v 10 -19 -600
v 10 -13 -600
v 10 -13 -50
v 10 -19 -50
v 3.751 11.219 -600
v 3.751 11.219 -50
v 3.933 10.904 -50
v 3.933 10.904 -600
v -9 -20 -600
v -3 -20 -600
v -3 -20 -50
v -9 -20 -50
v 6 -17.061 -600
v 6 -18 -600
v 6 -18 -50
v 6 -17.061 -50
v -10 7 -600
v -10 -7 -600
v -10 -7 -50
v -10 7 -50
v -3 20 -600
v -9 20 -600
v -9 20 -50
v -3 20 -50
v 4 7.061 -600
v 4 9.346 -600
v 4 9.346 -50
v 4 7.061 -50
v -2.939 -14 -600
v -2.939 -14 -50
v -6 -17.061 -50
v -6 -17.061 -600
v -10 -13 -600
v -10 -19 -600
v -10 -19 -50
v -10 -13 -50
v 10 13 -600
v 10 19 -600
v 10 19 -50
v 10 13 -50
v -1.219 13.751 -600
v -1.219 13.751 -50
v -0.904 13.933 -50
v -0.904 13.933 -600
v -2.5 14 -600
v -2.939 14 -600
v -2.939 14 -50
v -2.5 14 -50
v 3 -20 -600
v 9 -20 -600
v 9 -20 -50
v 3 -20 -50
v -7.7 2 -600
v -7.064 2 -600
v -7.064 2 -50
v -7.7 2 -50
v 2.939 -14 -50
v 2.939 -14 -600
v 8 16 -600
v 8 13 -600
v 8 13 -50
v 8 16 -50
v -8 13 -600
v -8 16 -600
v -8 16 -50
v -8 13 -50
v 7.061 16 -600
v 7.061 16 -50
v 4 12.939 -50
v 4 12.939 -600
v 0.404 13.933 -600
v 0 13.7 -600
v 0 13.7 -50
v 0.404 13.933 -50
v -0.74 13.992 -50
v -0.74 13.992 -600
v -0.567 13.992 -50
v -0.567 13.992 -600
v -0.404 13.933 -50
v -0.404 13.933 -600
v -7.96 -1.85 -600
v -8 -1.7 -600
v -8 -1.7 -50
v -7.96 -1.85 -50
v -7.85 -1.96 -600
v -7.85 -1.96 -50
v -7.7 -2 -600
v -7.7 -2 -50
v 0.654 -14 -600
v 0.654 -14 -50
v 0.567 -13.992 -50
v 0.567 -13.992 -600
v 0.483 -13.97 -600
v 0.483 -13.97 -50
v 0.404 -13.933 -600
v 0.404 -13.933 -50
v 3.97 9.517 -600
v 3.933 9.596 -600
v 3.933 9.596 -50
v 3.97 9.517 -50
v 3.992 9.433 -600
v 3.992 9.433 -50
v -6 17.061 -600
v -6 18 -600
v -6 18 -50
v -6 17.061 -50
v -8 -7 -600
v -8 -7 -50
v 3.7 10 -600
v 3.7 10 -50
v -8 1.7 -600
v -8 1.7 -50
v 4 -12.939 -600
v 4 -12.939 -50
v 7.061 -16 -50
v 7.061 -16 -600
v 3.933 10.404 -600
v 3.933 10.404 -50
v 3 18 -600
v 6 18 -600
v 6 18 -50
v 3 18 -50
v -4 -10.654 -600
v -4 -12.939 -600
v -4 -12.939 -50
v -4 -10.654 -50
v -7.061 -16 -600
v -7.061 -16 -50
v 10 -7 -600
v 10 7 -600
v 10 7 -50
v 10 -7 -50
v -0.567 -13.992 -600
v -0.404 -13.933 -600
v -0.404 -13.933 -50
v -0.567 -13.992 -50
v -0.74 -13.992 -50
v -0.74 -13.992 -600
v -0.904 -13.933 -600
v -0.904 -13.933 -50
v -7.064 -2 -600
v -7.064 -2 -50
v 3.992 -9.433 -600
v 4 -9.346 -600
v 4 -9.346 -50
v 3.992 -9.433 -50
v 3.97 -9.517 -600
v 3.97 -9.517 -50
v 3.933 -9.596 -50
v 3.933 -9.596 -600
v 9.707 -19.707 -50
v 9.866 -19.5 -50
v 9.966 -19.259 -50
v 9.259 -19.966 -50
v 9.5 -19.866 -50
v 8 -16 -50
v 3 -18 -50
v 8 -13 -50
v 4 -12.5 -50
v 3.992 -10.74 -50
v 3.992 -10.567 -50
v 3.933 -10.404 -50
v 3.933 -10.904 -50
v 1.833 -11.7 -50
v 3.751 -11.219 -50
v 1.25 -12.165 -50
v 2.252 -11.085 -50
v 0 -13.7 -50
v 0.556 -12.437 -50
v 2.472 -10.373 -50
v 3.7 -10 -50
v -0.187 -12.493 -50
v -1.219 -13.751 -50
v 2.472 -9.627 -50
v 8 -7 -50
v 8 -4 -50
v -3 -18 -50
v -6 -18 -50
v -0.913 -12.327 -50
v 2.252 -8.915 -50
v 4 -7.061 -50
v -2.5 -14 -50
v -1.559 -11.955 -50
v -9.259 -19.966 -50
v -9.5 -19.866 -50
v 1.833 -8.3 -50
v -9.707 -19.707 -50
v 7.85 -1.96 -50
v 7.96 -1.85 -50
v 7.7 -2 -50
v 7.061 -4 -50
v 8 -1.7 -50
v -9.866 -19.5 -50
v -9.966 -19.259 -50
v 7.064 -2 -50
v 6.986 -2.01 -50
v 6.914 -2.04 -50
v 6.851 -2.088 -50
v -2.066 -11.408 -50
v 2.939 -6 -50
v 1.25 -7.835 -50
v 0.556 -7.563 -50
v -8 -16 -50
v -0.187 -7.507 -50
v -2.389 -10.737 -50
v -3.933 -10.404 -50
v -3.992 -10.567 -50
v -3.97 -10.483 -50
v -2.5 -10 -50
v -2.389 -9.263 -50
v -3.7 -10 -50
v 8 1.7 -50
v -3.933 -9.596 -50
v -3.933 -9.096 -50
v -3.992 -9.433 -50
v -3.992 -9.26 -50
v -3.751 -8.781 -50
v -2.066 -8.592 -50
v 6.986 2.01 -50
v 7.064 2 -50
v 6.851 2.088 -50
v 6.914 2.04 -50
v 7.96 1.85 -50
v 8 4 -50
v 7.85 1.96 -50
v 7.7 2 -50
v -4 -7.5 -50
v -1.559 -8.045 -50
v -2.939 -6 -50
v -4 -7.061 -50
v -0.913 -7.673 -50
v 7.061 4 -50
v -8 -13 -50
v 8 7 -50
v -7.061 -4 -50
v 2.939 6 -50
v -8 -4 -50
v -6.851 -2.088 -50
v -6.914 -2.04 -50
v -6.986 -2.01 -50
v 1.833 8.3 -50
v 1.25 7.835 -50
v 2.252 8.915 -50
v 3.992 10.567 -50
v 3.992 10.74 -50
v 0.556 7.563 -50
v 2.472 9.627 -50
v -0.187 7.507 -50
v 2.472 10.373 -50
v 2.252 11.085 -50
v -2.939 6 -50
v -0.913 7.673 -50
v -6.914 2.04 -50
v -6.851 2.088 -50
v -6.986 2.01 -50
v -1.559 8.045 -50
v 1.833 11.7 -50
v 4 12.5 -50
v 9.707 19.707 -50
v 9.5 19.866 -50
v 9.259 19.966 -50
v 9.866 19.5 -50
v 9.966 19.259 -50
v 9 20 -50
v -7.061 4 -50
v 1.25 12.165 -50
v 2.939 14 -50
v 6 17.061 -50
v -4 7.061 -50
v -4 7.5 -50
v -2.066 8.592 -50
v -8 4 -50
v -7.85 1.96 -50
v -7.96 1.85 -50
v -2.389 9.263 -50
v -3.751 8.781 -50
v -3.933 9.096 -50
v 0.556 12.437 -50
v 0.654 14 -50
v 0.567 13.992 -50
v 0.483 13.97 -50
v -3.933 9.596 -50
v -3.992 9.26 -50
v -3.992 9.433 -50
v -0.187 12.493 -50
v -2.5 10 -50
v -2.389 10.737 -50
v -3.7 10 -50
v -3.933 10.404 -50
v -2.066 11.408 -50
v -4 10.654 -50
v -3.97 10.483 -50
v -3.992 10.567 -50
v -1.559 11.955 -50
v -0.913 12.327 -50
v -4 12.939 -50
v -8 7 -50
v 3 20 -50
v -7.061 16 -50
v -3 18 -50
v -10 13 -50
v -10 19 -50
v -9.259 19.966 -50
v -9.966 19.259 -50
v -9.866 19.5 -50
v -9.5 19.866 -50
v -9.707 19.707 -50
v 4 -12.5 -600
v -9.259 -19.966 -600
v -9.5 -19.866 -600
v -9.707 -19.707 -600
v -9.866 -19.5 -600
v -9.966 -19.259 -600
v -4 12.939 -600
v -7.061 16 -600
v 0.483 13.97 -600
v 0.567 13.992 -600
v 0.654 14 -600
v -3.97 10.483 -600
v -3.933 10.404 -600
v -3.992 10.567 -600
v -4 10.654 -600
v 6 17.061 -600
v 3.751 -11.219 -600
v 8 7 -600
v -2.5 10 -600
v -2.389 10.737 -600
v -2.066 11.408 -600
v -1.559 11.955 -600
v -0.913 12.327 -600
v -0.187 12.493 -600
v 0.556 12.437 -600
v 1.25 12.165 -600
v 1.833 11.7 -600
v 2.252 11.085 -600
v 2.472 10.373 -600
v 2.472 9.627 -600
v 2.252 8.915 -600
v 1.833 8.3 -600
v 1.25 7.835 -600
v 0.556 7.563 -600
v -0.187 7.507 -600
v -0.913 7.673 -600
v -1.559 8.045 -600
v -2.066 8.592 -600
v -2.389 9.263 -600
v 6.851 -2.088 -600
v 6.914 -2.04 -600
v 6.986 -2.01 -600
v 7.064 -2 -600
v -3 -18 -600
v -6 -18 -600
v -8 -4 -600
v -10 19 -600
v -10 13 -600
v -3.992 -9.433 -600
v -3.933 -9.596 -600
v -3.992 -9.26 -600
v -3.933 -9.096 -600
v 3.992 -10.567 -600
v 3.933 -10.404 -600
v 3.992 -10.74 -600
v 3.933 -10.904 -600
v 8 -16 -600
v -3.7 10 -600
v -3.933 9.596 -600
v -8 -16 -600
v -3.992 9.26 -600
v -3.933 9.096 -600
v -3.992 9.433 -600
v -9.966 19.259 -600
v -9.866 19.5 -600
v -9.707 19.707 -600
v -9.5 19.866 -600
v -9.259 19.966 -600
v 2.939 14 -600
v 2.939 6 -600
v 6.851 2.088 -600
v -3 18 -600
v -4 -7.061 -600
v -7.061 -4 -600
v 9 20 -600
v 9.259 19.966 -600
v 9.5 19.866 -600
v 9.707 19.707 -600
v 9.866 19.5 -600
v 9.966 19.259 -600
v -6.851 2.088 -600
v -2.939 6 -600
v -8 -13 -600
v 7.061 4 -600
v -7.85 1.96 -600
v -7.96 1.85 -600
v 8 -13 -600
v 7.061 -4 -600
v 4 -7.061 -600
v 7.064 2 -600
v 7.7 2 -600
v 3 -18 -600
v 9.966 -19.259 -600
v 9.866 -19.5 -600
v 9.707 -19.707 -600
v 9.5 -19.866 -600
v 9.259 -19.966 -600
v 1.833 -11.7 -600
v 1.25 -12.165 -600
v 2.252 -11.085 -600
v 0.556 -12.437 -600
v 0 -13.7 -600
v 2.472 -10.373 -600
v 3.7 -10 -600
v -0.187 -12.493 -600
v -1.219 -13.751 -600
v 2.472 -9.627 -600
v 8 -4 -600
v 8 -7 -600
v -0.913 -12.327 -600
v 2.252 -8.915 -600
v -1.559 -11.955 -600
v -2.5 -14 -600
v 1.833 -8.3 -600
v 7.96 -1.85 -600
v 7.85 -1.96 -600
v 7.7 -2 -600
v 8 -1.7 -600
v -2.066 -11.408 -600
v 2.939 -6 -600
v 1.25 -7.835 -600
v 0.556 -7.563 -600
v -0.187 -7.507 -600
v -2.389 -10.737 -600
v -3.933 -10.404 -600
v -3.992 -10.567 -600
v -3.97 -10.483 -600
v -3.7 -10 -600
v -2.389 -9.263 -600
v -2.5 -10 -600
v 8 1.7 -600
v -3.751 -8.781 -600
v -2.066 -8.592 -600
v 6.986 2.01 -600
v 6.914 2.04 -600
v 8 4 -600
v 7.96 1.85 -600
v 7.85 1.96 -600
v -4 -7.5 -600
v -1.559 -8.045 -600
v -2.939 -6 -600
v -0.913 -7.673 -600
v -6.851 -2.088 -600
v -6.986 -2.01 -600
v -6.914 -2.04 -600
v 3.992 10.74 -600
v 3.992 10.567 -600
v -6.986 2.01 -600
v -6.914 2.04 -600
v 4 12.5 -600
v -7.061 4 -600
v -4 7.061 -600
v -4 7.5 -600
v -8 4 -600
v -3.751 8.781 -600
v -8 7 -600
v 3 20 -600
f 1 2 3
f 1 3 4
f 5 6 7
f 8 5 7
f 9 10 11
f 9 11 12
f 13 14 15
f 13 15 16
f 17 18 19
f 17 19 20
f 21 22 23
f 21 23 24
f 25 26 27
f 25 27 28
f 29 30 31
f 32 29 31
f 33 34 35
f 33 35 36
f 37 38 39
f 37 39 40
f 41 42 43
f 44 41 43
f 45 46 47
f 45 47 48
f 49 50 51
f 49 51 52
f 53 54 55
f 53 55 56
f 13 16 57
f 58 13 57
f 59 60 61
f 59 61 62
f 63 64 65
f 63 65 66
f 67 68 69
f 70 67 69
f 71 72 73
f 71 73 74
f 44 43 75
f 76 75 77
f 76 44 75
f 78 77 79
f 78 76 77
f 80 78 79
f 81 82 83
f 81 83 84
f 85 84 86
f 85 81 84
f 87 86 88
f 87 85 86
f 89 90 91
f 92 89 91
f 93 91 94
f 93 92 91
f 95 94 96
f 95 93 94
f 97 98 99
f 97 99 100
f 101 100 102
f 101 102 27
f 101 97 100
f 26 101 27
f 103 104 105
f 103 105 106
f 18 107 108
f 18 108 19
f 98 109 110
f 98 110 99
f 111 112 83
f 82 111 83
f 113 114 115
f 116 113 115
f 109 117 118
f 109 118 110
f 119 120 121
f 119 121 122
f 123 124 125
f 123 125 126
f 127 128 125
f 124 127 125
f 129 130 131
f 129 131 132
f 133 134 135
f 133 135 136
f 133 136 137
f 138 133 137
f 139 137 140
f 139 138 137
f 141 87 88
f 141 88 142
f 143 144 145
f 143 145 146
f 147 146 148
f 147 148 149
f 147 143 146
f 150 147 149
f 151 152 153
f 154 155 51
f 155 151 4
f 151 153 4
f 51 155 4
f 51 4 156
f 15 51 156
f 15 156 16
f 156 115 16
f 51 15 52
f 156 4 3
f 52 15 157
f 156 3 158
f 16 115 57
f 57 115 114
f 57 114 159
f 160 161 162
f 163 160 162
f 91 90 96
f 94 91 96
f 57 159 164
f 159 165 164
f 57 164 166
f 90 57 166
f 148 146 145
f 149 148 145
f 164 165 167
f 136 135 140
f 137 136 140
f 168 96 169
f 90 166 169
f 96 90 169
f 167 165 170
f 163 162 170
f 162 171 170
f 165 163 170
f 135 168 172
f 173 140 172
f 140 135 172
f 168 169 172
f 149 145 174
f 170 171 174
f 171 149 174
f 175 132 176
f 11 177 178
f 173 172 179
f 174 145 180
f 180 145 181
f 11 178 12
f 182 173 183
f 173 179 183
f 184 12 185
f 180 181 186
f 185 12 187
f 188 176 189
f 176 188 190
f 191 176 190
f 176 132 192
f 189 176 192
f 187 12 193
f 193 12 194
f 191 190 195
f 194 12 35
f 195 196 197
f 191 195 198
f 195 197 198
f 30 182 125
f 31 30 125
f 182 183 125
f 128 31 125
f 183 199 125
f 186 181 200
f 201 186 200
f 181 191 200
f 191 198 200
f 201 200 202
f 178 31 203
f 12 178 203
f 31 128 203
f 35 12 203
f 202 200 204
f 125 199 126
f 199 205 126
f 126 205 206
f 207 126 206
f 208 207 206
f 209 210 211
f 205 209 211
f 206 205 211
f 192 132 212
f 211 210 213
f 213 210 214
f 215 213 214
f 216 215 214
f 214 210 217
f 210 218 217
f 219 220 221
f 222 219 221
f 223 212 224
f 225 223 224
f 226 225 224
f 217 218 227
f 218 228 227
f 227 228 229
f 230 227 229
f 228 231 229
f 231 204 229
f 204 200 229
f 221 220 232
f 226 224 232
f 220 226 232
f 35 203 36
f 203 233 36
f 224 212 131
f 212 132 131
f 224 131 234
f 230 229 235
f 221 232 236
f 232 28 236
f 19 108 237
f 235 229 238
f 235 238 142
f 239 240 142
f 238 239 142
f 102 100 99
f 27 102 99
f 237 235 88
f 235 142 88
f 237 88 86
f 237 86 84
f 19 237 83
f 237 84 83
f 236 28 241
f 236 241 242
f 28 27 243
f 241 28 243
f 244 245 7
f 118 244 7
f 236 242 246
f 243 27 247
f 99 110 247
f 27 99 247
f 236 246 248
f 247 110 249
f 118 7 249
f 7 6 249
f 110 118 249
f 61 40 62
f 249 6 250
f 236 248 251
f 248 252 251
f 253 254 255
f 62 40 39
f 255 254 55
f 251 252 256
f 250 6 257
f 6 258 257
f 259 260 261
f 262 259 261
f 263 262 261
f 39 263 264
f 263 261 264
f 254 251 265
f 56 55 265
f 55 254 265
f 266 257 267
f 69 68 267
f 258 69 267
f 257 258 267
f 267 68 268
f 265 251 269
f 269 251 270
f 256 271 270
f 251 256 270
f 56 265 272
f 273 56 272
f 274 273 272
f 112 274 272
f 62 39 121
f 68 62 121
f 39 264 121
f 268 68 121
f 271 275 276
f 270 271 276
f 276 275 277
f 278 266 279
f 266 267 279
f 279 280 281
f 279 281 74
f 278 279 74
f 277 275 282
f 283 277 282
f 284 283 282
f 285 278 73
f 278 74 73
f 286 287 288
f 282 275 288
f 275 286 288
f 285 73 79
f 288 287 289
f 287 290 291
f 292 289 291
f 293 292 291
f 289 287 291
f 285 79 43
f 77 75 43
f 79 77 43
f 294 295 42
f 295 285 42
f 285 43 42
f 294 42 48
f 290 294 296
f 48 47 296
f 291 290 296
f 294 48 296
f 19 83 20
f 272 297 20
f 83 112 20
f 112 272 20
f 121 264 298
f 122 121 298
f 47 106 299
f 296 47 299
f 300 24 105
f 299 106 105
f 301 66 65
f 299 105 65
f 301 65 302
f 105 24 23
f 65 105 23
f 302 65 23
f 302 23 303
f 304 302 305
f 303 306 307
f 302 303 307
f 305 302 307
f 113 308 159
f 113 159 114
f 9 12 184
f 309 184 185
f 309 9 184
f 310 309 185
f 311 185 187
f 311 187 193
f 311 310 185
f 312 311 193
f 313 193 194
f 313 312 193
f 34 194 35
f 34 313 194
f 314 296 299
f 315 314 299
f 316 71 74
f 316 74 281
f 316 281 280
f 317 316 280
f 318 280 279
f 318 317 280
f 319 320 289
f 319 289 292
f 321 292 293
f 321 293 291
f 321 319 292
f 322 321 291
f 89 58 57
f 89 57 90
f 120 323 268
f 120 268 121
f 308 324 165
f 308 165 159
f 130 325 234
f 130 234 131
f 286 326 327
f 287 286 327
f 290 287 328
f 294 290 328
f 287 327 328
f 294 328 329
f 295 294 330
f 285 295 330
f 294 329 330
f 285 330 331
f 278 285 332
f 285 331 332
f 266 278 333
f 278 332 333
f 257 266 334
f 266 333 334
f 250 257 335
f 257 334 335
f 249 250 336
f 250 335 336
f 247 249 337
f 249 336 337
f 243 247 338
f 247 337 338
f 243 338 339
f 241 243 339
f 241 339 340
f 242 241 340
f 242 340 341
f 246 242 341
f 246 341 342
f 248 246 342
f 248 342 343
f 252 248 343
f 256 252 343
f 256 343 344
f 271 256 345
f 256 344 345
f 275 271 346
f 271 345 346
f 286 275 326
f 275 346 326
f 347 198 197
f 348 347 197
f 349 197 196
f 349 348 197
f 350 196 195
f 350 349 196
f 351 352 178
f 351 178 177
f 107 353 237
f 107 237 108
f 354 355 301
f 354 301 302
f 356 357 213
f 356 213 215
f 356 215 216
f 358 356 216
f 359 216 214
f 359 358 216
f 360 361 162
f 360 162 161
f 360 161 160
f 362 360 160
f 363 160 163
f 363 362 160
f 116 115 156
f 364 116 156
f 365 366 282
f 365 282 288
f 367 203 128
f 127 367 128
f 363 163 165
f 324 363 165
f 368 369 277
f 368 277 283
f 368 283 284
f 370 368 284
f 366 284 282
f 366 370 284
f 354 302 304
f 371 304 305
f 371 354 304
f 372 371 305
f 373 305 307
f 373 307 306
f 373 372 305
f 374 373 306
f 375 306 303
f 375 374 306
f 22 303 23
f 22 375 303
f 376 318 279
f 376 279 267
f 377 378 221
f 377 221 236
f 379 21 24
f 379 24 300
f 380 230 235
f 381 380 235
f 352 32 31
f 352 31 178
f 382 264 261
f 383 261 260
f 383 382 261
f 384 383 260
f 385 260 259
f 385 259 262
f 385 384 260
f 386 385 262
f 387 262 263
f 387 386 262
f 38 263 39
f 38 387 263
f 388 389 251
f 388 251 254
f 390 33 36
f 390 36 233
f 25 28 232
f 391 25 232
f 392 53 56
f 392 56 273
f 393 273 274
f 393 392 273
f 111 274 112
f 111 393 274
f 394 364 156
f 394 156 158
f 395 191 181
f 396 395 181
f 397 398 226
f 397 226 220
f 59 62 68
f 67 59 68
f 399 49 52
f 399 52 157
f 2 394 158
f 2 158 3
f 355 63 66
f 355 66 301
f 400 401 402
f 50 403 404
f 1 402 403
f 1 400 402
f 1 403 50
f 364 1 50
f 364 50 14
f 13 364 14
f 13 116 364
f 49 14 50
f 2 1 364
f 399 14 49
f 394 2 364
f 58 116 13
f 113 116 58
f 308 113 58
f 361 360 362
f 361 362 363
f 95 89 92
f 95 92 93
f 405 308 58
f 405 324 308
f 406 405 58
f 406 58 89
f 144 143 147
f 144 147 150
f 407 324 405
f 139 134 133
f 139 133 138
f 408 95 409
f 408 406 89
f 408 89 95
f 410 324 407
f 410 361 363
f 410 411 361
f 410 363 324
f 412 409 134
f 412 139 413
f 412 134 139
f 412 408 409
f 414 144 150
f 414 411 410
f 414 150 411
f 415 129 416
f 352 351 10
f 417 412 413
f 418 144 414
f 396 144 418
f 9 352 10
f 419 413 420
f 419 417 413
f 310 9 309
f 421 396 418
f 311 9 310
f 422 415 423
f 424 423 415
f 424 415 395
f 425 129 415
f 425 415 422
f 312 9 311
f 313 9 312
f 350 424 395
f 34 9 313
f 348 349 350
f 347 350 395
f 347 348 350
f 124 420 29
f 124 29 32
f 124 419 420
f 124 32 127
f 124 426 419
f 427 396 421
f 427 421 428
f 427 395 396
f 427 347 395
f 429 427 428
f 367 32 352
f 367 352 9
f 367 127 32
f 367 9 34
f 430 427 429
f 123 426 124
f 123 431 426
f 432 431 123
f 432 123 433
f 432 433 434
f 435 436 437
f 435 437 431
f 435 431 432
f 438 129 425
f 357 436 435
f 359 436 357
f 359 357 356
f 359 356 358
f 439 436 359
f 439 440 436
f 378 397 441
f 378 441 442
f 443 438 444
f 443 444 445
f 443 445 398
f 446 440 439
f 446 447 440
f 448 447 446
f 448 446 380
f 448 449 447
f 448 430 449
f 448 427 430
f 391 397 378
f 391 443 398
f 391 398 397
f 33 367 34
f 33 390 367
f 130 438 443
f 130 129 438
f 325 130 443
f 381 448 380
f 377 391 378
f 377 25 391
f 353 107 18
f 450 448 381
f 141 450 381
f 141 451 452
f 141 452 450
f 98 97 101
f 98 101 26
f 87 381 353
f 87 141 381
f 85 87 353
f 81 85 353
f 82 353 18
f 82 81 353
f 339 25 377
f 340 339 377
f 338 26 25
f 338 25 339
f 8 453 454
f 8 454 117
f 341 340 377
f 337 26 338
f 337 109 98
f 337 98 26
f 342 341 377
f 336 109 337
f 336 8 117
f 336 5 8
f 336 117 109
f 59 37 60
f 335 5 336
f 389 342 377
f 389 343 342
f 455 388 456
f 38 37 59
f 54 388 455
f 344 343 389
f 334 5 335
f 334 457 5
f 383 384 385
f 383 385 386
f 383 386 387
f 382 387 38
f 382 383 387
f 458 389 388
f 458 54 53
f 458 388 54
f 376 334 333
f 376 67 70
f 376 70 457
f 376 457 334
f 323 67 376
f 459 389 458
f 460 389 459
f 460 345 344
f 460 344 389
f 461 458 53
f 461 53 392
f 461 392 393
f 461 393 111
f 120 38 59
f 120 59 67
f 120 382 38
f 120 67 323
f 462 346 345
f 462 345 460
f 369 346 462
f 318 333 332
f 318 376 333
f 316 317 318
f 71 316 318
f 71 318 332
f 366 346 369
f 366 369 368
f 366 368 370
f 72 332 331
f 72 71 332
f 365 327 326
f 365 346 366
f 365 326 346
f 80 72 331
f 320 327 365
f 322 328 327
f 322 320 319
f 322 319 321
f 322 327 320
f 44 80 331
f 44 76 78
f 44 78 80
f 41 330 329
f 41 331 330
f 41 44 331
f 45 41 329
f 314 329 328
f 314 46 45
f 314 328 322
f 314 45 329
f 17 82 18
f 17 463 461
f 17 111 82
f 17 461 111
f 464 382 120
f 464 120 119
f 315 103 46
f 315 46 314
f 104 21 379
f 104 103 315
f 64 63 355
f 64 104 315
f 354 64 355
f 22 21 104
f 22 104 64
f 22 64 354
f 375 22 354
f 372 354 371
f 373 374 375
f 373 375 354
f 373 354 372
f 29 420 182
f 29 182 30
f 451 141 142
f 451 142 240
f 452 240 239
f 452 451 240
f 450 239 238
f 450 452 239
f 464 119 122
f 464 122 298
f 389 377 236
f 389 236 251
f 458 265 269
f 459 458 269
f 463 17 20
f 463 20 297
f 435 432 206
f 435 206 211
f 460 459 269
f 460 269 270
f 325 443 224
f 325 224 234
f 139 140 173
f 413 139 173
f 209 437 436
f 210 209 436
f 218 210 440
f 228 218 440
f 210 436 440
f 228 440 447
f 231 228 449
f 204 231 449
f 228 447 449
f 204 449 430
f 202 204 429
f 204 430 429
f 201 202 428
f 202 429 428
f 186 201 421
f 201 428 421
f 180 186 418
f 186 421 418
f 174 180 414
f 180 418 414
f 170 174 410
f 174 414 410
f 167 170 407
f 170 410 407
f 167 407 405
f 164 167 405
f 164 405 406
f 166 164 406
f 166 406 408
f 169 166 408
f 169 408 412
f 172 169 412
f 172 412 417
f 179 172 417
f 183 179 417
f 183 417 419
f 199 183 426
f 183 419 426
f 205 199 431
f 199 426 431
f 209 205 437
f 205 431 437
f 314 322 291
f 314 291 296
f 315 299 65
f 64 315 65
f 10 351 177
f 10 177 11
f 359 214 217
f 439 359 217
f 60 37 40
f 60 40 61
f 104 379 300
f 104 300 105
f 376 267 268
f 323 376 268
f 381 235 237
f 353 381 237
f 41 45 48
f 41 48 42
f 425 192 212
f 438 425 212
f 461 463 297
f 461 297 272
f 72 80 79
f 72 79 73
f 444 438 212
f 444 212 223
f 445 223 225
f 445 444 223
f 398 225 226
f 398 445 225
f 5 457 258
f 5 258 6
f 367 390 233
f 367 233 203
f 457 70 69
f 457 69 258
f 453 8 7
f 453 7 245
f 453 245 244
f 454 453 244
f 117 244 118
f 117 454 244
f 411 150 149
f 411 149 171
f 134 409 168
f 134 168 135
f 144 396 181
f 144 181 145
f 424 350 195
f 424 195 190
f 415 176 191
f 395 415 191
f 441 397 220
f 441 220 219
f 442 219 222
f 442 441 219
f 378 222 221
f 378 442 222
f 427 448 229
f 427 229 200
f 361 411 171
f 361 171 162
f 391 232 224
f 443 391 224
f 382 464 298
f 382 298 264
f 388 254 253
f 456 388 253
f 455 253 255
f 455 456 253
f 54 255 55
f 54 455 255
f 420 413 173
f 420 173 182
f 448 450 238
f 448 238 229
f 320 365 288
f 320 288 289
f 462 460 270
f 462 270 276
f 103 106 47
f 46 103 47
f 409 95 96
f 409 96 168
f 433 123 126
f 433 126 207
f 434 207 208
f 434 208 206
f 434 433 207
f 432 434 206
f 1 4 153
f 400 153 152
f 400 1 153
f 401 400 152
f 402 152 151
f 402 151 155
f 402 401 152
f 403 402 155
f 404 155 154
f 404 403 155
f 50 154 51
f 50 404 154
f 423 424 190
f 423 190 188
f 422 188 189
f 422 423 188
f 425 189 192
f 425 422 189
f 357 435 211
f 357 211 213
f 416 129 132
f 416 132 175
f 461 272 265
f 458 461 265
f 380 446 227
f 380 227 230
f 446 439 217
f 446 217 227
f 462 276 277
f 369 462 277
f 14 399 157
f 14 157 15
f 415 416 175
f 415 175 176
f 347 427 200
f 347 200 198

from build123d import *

# Parameters (mm, degrees)
SKETCH1_R           = 2.5
BOSS_EXTRUDE1_DEPTH = 550


with BuildPart() as part:
    # Sketch1 → Boss-Extrude1 (new body)
    with BuildSketch(Plane(origin=(0, 0, -600), x_dir=(-1, 0, 0), z_dir=(0, 0, -1))):
        with BuildLine():
            Line((10, -7), (10, 7))
            Line((10, 7), (8, 7))
            Line((8, 7), (8, 4))
            Line((8, 4), (7.060660172, 4))
            Line((7.060660172, 4), (4, 7.060660172))
            Line((4, 7.060660172), (4, 7.5))
            Line((4, 7.5), (3.750976592, 8.781114371))
            Line((3.750976592, 8.781114371), (3.933012702, 9.096410162))
            ThreePointArc((3.933012702, 9.096410162), (4, 9.346410162), (3.933012702, 9.596410162))
            Line((3.933012702, 9.596410162), (3.7, 10))
            Line((3.7, 10), (3.933012702, 10.403589838))
            ThreePointArc((3.933012702, 10.403589838), (3.982962913, 10.524180316), (4, 10.653589838))
            Line((4, 10.653589838), (4, 12.939339828))
            Line((4, 12.939339828), (7.060660172, 16))
            Line((7.060660172, 16), (8, 16))
            Line((8, 16), (8, 13))
            Line((8, 13), (10, 13))
            Line((10, 13), (10, 19))
            ThreePointArc((10, 19), (9.707106781, 19.707106781), (9, 20))
            Line((9, 20), (3, 20))
            Line((3, 20), (3, 18))
            Line((3, 18), (6, 18))
            Line((6, 18), (6, 17.060660172))
            Line((6, 17.060660172), (2.939339828, 14))
            Line((2.939339828, 14), (2.5, 14))
            Line((2.5, 14), (1.218885629, 13.750976592))
            Line((1.218885629, 13.750976592), (0.903589838, 13.933012702))
            ThreePointArc((0.903589838, 13.933012702), (0.653589838, 14), (0.403589838, 13.933012702))
            Line((0.403589838, 13.933012702), (0, 13.7))
            Line((0, 13.7), (-0.403589838, 13.933012702))
            ThreePointArc((-0.403589838, 13.933012702), (-0.524180316, 13.982962913), (-0.653589838, 14))
            Line((-0.653589838, 14), (-2.939339828, 14))
            Line((-2.939339828, 14), (-6, 17.060660172))
            Line((-6, 17.060660172), (-6, 18))
            Line((-6, 18), (-3, 18))
            Line((-3, 18), (-3, 20))
            Line((-3, 20), (-9, 20))
            ThreePointArc((-9, 20), (-9.707106781, 19.707106781), (-10, 19))
            Line((-10, 19), (-10, 13))
            Line((-10, 13), (-8, 13))
            Line((-8, 13), (-8, 16))
            Line((-8, 16), (-7.060660172, 16))
            Line((-7.060660172, 16), (-4, 12.939339828))
            Line((-4, 12.939339828), (-4, 12.5))
            Line((-4, 12.5), (-3.750976592, 11.218885629))
            Line((-3.750976592, 11.218885629), (-3.933012702, 10.903589838))
            ThreePointArc((-3.933012702, 10.903589838), (-4, 10.653589838), (-3.933012702, 10.403589838))
            Line((-3.933012702, 10.403589838), (-3.7, 10))
            Line((-3.7, 10), (-3.933012702, 9.596410162))
            ThreePointArc((-3.933012702, 9.596410162), (-3.982962913, 9.475819684), (-4, 9.346410162))
            Line((-4, 9.346410162), (-4, 7.060660172))
            Line((-4, 7.060660172), (-7.060660172, 4))
            Line((-7.060660172, 4), (-8, 4))
            Line((-8, 4), (-8, 7))
            Line((-8, 7), (-10, 7))
            Line((-10, 7), (-10, -7))
            Line((-10, -7), (-8, -7))
            Line((-8, -7), (-8, -4))
            Line((-8, -4), (-7.060660172, -4))
            Line((-7.060660172, -4), (-4, -7.060660172))
            Line((-4, -7.060660172), (-4, -9.346410162))
            ThreePointArc((-4, -9.346410162), (-3.982962913, -9.475819684), (-3.933012702, -9.596410162))
            Line((-3.933012702, -9.596410162), (-3.7, -10))
            Line((-3.7, -10), (-3.933012702, -10.403589838))
            ThreePointArc((-3.933012702, -10.403589838), (-4, -10.653589838), (-3.933012702, -10.903589838))
            Line((-3.933012702, -10.903589838), (-3.750976592, -11.218885629))
            Line((-3.750976592, -11.218885629), (-4, -12.5))
            Line((-4, -12.5), (-4, -12.939339828))
            Line((-4, -12.939339828), (-7.060660172, -16))
            Line((-7.060660172, -16), (-8, -16))
            Line((-8, -16), (-8, -13))
            Line((-8, -13), (-10, -13))
            Line((-10, -13), (-10, -19))
            ThreePointArc((-10, -19), (-9.707106781, -19.707106781), (-9, -20))
            Line((-9, -20), (-3, -20))
            Line((-3, -20), (-3, -18))
            Line((-3, -18), (-6, -18))
            Line((-6, -18), (-6, -17.060660172))
            Line((-6, -17.060660172), (-2.939339828, -14))
            Line((-2.939339828, -14), (-0.653589838, -14))
            ThreePointArc((-0.653589838, -14), (-0.524180316, -13.982962913), (-0.403589838, -13.933012702))
            Line((-0.403589838, -13.933012702), (0, -13.7))
            Line((0, -13.7), (0.403589839, -13.933012702))
            ThreePointArc((0.403589839, -13.933012702), (0.653589839, -14), (0.903589838, -13.933012702))
            Line((0.903589838, -13.933012702), (1.218885629, -13.750976592))
            Line((1.218885629, -13.750976592), (2.5, -14))
            Line((2.5, -14), (2.939339828, -14))
            Line((2.939339828, -14), (6, -17.060660172))
            Line((6, -17.060660172), (6, -18))
            Line((6, -18), (3, -18))
            Line((3, -18), (3, -20))
            Line((3, -20), (9, -20))
            ThreePointArc((9, -20), (9.707106781, -19.707106781), (10, -19))
            Line((10, -19), (10, -13))
            Line((10, -13), (8, -13))
            Line((8, -13), (8, -16))
            Line((8, -16), (7.060660172, -16))
            Line((7.060660172, -16), (4, -12.939339828))
            Line((4, -12.939339828), (4, -10.653589838))
            ThreePointArc((4, -10.653589838), (3.982962913, -10.524180316), (3.933012702, -10.403589838))
            Line((3.933012702, -10.403589838), (3.7, -10))
            Line((3.7, -10), (3.933012702, -9.596410162))
            ThreePointArc((3.933012702, -9.596410162), (4, -9.346410162), (3.933012702, -9.096410162))
            Line((3.933012702, -9.096410162), (3.750976592, -8.781114371))
            Line((3.750976592, -8.781114371), (4, -7.5))
            Line((4, -7.5), (4, -7.060660172))
            Line((4, -7.060660172), (7.060660172, -4))
            Line((7.060660172, -4), (8, -4))
            Line((8, -4), (8, -7))
            Line((8, -7), (10, -7))
        make_face()
        with Locations((0, -10)):
            Circle(SKETCH1_R, mode=Mode.SUBTRACT)
        with Locations((0, 10)):
            Circle(SKETCH1_R, mode=Mode.SUBTRACT)
        with BuildLine():
            Line((8, 1.7), (8, -1.7))
            ThreePointArc((8, -1.7), (7.912132034, -1.912132034), (7.7, -2))
            Line((7.7, -2), (7.063603897, -2))
            ThreePointArc((7.063603897, -2), (6.948798867, -2.02283614), (6.851471863, -2.087867966))
            Line((6.851471863, -2.087867966), (2.939339828, -6))
            Line((2.939339828, -6), (-2.939339828, -6))
            Line((-2.939339828, -6), (-6.851471863, -2.087867966))
            ThreePointArc((-6.851471863, -2.087867966), (-6.948798867, -2.02283614), (-7.063603897, -2))
            Line((-7.063603897, -2), (-7.7, -2))
            ThreePointArc((-7.7, -2), (-7.912132034, -1.912132034), (-8, -1.7))
            Line((-8, -1.7), (-8, 1.7))
            ThreePointArc((-8, 1.7), (-7.912132034, 1.912132034), (-7.7, 2))
            Line((-7.7, 2), (-7.063603897, 2))
            ThreePointArc((-7.063603897, 2), (-6.948798867, 2.02283614), (-6.851471863, 2.087867966))
            Line((-6.851471863, 2.087867966), (-2.939339828, 6))
            Line((-2.939339828, 6), (2.939339828, 6))
            Line((2.939339828, 6), (6.851471863, 2.087867966))
            ThreePointArc((6.851471863, 2.087867966), (6.948798867, 2.02283614), (7.063603897, 2))
            Line((7.063603897, 2), (7.7, 2))
            ThreePointArc((7.7, 2), (7.912132034, 1.912132034), (8, 1.7))
        make_face(mode=Mode.SUBTRACT)
    extrude(amount=-BOSS_EXTRUDE1_DEPTH)


solid = part.part
